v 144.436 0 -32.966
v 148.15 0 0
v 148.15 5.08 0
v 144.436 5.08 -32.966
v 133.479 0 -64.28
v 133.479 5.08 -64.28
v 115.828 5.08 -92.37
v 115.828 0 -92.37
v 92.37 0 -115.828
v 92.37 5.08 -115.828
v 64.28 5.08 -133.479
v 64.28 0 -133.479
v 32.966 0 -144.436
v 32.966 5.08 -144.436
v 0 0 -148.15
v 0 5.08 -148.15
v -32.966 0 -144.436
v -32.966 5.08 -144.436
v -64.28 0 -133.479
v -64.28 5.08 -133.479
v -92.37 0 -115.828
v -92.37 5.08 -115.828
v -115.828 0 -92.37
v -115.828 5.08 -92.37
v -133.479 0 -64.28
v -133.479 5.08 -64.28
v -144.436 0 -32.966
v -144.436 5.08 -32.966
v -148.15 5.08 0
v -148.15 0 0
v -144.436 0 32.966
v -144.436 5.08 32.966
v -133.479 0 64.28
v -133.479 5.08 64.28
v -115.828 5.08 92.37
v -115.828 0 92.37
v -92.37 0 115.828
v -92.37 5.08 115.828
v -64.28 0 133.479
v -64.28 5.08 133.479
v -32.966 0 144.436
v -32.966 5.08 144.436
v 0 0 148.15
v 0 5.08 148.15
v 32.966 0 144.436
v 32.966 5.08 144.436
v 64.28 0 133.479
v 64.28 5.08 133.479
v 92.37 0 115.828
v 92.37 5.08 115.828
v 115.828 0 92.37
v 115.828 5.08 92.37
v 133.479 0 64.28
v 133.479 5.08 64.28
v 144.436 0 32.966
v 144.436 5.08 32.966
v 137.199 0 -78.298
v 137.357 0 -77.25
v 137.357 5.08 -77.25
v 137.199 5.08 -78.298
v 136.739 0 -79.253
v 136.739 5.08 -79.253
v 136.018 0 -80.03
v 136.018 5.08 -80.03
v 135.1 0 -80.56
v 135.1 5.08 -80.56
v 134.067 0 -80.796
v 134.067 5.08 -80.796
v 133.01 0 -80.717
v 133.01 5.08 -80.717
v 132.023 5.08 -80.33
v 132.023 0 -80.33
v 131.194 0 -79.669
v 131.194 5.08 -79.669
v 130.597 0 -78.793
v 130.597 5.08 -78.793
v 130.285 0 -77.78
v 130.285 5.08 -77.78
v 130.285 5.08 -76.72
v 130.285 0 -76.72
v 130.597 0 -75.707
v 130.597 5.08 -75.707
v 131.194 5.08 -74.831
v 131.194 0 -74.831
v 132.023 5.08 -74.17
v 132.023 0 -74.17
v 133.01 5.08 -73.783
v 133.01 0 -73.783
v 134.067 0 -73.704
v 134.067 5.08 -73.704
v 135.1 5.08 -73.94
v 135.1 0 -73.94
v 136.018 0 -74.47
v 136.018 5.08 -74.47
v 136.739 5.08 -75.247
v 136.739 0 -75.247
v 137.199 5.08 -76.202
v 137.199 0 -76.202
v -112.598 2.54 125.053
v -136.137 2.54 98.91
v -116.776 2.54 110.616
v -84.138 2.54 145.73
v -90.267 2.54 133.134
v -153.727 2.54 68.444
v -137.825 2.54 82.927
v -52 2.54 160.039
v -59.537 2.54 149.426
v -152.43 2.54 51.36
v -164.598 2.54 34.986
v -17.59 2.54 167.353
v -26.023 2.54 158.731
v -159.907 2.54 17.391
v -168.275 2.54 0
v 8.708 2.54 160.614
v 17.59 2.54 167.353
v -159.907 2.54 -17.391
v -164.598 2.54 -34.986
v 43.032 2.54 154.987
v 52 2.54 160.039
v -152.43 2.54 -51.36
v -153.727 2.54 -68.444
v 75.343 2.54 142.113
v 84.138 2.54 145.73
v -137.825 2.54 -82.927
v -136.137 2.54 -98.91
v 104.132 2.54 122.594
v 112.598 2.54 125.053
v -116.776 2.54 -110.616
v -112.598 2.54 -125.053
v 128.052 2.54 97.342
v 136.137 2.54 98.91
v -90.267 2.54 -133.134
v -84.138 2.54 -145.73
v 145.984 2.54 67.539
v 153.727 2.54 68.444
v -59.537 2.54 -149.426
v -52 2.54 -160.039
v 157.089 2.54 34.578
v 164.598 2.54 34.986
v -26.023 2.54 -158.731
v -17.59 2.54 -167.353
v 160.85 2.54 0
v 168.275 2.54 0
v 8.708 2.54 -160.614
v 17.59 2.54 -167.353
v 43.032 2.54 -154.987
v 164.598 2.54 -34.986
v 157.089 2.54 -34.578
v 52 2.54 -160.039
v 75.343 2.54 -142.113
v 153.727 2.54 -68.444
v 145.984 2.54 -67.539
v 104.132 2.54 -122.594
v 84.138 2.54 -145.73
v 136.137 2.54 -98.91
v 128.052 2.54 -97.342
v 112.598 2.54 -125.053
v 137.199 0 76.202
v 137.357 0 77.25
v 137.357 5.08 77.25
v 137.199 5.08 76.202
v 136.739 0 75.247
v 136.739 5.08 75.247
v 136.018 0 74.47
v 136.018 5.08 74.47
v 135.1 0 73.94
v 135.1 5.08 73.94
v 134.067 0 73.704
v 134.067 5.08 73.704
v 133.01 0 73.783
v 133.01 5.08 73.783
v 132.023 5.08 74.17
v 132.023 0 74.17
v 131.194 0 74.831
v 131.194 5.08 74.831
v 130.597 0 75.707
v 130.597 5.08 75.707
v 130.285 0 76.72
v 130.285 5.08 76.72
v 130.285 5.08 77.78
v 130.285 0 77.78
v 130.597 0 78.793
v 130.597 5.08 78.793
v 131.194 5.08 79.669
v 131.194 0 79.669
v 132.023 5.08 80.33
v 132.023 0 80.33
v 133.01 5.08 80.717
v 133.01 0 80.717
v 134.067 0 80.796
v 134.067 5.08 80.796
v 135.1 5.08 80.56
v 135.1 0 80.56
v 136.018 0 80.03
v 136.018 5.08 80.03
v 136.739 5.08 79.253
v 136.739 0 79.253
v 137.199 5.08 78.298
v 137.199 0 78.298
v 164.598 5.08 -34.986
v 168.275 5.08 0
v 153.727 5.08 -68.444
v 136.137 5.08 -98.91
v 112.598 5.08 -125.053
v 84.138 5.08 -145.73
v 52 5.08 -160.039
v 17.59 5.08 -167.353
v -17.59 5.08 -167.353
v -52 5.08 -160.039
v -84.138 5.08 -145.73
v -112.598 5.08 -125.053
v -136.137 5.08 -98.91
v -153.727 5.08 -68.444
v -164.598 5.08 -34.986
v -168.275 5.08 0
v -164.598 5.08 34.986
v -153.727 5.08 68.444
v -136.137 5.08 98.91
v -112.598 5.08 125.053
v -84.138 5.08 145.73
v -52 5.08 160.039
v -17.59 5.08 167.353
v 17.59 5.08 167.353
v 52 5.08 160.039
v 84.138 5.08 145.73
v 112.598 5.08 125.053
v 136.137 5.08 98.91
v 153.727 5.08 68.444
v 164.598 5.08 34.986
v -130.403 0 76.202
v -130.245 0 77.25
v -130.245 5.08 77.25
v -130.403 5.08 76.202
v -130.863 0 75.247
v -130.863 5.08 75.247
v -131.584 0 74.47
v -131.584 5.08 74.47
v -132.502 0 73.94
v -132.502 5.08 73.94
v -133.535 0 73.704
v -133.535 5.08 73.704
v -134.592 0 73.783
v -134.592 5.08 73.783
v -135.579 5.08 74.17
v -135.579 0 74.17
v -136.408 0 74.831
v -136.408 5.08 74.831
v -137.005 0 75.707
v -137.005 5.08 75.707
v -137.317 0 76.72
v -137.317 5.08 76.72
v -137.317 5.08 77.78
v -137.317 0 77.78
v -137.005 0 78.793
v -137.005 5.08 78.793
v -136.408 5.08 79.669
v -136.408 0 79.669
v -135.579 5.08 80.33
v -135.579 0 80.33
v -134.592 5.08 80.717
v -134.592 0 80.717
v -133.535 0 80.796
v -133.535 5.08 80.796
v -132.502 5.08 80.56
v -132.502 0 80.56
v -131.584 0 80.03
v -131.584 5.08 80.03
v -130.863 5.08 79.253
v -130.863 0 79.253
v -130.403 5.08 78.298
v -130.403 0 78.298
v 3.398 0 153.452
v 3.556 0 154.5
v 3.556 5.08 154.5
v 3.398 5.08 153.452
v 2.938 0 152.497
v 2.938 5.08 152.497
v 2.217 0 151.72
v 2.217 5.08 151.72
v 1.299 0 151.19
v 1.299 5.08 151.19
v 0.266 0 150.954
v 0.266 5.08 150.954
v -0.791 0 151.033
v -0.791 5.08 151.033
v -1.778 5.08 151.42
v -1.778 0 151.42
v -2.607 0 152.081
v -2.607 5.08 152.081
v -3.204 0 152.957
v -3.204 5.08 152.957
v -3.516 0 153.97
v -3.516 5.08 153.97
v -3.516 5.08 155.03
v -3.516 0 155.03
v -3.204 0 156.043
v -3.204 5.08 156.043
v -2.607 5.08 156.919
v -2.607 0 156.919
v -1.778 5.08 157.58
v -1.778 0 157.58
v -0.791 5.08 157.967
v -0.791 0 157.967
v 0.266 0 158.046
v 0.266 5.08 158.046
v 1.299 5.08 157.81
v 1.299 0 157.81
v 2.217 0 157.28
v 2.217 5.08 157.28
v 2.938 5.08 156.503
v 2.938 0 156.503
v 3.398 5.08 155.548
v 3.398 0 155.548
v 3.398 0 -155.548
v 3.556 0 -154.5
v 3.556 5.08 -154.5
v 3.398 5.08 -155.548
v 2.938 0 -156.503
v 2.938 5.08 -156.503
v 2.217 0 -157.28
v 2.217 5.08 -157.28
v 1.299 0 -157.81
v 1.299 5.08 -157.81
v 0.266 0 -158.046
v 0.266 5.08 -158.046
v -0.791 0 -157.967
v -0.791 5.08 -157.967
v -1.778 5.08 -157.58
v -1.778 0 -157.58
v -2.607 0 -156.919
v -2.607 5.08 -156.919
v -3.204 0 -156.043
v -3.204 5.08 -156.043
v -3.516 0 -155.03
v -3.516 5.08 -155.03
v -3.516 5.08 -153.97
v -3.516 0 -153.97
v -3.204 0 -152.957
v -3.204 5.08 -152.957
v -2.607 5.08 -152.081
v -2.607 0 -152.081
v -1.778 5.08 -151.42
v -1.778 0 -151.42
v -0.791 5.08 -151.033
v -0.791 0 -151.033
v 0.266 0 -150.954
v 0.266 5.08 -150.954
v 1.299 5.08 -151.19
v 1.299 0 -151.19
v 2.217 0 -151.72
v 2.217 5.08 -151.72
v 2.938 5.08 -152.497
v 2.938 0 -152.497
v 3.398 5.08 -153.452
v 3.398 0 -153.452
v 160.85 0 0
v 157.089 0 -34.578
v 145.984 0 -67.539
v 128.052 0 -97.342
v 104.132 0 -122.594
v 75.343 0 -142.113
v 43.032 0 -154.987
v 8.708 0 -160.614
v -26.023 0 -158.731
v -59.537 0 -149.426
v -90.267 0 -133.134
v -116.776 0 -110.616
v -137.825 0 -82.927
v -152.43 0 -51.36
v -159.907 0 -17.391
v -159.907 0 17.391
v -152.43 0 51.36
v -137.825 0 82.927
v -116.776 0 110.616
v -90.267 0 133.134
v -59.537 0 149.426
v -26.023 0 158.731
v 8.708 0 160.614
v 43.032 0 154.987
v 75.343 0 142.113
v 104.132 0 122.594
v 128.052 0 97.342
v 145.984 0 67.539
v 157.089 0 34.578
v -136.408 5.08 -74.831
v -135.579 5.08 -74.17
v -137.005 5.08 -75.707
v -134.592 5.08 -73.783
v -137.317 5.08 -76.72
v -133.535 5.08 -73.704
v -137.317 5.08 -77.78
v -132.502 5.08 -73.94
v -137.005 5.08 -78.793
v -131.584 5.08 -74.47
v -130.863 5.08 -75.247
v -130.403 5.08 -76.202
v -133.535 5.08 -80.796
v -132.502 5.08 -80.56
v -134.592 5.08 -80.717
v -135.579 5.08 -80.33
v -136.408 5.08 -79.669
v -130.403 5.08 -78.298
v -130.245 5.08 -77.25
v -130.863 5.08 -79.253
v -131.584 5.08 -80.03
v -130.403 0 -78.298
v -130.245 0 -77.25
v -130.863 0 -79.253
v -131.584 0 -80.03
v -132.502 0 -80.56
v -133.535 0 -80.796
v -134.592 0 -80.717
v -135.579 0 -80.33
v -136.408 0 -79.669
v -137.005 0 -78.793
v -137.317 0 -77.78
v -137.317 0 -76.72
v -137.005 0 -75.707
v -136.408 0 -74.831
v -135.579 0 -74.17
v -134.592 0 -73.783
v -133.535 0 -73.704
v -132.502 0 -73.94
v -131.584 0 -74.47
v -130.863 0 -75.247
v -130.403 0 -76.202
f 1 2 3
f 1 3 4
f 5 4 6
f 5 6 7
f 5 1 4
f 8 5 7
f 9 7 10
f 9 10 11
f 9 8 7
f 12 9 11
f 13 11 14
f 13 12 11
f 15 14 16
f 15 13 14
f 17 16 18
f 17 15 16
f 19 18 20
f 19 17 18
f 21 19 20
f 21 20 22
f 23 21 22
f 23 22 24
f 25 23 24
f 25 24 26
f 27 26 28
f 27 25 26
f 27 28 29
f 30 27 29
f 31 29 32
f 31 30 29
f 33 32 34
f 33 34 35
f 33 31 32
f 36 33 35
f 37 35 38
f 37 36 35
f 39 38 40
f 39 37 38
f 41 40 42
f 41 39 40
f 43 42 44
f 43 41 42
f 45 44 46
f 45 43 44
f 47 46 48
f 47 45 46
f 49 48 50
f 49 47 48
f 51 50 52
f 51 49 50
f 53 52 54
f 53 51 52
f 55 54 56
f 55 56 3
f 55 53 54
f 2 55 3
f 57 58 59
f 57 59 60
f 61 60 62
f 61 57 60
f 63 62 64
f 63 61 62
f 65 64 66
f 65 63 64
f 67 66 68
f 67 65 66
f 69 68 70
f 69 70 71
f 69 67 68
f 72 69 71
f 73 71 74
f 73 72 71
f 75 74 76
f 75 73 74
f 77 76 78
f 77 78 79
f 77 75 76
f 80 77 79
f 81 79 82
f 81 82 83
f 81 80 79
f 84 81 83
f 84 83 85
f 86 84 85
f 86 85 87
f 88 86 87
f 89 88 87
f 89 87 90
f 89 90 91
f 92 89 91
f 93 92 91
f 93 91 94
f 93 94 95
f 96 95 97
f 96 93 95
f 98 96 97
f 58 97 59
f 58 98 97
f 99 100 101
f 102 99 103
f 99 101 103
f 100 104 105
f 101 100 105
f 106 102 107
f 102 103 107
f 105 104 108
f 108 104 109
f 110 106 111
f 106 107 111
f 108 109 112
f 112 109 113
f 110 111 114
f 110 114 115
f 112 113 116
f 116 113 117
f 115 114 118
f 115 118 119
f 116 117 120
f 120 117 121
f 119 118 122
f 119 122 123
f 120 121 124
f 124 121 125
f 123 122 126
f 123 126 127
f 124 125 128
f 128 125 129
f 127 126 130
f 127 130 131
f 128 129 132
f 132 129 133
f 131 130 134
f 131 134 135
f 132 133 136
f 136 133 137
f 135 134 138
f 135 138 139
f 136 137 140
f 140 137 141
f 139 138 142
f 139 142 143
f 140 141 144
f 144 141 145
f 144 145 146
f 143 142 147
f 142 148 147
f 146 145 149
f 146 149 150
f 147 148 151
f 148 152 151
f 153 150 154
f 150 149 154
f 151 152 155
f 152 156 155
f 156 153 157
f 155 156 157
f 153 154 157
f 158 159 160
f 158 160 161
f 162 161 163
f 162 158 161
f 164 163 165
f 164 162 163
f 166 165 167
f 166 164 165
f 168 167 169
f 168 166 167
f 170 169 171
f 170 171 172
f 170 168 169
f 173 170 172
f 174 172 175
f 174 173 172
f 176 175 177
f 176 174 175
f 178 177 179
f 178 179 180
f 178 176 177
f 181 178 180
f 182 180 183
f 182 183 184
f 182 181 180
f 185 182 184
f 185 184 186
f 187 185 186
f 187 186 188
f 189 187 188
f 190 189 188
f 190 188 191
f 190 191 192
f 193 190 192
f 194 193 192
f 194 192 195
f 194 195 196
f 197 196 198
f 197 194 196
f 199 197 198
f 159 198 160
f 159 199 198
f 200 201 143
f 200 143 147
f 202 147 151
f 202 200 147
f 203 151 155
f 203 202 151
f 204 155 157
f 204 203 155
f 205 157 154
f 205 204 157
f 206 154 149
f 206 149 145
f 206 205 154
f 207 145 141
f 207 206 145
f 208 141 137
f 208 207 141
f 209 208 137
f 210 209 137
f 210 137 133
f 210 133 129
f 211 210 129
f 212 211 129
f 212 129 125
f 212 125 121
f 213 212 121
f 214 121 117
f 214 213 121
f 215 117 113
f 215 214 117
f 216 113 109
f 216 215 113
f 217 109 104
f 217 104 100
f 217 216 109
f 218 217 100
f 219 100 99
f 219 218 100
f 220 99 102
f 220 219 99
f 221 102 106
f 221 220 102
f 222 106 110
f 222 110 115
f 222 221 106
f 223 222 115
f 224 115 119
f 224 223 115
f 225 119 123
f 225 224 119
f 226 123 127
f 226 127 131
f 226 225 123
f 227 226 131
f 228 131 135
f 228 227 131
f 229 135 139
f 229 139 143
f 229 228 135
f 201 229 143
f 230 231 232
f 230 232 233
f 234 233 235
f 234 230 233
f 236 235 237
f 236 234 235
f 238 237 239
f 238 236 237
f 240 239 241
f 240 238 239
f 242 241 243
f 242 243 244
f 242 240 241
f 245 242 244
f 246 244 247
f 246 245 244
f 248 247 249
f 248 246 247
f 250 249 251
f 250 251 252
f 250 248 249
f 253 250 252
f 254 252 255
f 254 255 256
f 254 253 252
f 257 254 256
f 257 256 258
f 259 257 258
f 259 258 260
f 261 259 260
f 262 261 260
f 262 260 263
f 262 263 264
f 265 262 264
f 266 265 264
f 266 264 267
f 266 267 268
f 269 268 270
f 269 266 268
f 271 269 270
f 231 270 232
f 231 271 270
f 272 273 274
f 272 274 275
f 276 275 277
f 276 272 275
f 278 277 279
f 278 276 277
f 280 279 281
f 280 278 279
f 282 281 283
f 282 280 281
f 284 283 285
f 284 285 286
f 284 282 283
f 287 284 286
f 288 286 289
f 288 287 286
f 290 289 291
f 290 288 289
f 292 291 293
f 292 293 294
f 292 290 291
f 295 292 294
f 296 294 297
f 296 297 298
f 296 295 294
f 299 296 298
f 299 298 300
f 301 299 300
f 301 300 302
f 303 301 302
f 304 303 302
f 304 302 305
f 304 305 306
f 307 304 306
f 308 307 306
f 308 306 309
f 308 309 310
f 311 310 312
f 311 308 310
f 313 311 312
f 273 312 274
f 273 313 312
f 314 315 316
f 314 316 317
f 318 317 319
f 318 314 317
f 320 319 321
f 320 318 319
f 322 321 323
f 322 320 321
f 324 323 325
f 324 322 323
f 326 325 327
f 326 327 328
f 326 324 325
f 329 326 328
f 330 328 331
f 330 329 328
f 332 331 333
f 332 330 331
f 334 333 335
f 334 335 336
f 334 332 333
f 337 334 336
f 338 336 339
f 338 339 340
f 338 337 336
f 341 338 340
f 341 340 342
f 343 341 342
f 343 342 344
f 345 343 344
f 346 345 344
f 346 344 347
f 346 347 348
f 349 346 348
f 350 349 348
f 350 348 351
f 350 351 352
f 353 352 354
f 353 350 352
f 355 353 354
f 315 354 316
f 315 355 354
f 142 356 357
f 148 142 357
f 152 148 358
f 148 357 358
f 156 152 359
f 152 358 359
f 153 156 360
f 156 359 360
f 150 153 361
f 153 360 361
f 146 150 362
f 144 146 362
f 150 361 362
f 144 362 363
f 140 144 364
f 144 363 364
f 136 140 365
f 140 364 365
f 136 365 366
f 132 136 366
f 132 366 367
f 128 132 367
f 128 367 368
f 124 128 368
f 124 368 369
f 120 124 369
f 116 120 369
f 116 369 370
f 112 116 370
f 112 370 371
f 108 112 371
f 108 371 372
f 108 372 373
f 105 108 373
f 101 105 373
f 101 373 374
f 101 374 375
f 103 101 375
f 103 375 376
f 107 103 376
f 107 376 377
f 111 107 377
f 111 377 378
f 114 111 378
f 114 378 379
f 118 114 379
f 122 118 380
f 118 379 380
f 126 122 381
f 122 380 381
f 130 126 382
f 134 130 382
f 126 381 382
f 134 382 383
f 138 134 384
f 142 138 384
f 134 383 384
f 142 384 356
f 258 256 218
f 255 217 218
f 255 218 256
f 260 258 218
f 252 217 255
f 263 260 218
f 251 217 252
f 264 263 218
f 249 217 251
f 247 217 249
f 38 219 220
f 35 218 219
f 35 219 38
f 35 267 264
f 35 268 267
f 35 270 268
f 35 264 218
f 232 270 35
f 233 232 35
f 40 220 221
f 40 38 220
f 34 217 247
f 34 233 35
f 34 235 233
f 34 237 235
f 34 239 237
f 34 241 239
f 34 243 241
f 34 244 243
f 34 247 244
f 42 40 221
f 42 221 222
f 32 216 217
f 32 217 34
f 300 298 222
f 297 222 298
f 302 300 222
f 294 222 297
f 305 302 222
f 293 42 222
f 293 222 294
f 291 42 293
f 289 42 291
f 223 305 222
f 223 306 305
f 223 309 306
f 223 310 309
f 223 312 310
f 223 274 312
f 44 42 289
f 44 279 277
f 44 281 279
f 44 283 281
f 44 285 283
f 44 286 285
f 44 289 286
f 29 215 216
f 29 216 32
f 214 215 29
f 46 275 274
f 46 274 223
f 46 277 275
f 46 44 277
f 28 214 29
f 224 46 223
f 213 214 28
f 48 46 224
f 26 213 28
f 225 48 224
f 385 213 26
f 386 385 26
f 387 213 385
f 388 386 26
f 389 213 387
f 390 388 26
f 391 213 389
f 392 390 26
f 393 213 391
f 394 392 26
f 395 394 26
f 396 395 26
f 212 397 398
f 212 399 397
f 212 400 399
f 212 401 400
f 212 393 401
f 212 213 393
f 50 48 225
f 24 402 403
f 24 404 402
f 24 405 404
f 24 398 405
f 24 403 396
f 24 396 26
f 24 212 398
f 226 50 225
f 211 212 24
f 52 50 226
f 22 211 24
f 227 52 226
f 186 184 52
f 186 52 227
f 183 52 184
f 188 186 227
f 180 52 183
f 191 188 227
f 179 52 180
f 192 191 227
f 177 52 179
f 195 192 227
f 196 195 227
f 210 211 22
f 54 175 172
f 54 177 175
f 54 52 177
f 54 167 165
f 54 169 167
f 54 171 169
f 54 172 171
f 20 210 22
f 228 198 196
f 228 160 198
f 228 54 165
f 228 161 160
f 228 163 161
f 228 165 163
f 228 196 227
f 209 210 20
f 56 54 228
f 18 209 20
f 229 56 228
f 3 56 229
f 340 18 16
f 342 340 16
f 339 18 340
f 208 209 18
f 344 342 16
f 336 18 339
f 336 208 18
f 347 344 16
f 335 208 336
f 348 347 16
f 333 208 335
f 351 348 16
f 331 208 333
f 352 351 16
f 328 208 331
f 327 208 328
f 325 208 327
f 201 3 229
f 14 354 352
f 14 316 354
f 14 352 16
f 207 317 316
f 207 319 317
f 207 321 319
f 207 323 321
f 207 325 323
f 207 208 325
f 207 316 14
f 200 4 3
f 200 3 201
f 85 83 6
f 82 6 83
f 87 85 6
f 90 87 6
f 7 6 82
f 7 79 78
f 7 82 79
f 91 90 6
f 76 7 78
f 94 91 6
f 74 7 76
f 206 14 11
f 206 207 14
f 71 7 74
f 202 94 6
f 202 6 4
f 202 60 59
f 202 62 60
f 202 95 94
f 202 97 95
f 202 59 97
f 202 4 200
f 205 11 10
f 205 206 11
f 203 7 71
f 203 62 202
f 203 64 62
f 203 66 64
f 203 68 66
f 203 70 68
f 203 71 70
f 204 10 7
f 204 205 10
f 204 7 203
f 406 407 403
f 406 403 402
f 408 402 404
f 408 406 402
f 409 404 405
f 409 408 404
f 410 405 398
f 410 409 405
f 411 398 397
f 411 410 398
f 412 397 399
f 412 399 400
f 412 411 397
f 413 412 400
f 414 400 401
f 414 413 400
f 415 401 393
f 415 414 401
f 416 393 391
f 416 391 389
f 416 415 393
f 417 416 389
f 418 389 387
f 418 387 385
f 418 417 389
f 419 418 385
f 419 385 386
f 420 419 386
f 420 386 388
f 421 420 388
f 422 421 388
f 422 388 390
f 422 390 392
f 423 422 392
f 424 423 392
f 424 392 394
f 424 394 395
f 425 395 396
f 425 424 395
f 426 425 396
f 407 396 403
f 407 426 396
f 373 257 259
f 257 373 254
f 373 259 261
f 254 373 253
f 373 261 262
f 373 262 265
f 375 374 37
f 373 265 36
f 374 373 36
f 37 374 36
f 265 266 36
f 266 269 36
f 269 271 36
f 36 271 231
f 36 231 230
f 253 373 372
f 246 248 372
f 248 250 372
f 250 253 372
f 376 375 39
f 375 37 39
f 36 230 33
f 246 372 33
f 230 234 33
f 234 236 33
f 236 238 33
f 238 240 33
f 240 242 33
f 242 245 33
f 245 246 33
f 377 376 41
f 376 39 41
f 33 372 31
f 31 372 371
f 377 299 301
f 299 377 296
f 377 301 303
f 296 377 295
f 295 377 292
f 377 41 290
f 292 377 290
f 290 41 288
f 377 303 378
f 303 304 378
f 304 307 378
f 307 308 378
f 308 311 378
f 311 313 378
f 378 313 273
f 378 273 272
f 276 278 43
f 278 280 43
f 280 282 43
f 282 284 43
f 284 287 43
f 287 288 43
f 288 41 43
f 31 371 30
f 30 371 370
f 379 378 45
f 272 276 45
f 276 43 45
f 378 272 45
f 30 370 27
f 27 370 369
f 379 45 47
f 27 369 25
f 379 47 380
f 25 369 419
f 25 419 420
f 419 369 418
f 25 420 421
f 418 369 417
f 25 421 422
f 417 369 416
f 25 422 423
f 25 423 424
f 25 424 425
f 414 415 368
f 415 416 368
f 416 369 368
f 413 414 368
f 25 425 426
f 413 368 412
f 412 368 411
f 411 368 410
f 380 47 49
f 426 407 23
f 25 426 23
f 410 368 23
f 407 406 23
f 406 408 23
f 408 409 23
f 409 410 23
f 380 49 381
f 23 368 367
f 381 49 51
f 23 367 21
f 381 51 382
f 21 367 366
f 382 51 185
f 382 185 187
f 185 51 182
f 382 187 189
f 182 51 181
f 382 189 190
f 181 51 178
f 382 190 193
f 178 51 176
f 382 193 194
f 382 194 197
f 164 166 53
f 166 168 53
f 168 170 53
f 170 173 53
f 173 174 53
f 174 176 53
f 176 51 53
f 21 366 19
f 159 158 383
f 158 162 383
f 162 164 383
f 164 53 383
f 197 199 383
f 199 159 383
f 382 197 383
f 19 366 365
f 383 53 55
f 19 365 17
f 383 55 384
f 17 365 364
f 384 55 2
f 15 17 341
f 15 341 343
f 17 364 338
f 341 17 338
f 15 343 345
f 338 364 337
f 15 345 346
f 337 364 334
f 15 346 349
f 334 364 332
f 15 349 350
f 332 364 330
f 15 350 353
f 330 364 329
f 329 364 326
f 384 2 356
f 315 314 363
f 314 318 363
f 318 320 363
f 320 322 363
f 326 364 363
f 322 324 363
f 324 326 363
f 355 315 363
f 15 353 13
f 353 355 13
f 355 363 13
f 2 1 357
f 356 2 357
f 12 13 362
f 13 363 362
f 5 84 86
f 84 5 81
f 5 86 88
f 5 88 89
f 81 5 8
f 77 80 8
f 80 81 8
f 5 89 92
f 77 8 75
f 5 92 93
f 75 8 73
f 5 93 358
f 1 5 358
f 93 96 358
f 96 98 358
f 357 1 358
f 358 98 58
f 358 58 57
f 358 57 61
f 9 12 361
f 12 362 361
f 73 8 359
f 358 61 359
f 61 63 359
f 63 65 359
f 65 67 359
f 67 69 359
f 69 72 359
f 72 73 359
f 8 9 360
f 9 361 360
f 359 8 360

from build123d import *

# Parameters (mm, degrees)
SKETCH1_R           = 160.85
SKETCH1_R_2         = 3.556
SKETCH1_R_3         = 148.15
BOSS_EXTRUDE1_DEPTH = 5.08
SKETCH2_R           = 168.275
SKETCH2_R_2         = 160.85
BOSS_EXTRUDE2_DEPTH = 2.54


with BuildPart() as part:
    # Sketch1 → Boss-Extrude1 (new body)
    with BuildSketch(Plane(origin=(0, 0, 0), x_dir=(1, 0, 0), z_dir=(0, 1, 0))):
        Circle(SKETCH1_R)
        with Locations((0, 154.5)):
            Circle(SKETCH1_R_2, mode=Mode.SUBTRACT)
        with Locations((133.800924885, 77.25)):
            Circle(SKETCH1_R_2, mode=Mode.SUBTRACT)
        with Locations((133.800924885, -77.25)):
            Circle(SKETCH1_R_2, mode=Mode.SUBTRACT)
        with Locations((0, -154.5)):
            Circle(SKETCH1_R_2, mode=Mode.SUBTRACT)
        with Locations((-133.800924885, -77.25)):
            Circle(SKETCH1_R_2, mode=Mode.SUBTRACT)
        with Locations((-133.800924885, 77.25)):
            Circle(SKETCH1_R_2, mode=Mode.SUBTRACT)
        Circle(SKETCH1_R_3, mode=Mode.SUBTRACT)
    extrude(amount=BOSS_EXTRUDE1_DEPTH)

    # Sketch2 → Boss-Extrude2 (add)
    with BuildSketch(Plane(origin=(0, 5.08, 0), x_dir=(1, 0, 0), z_dir=(0, 1, 0))):
        Circle(SKETCH2_R)
        Circle(SKETCH2_R_2, mode=Mode.SUBTRACT)
    extrude(amount=-BOSS_EXTRUDE2_DEPTH)


solid = part.part
